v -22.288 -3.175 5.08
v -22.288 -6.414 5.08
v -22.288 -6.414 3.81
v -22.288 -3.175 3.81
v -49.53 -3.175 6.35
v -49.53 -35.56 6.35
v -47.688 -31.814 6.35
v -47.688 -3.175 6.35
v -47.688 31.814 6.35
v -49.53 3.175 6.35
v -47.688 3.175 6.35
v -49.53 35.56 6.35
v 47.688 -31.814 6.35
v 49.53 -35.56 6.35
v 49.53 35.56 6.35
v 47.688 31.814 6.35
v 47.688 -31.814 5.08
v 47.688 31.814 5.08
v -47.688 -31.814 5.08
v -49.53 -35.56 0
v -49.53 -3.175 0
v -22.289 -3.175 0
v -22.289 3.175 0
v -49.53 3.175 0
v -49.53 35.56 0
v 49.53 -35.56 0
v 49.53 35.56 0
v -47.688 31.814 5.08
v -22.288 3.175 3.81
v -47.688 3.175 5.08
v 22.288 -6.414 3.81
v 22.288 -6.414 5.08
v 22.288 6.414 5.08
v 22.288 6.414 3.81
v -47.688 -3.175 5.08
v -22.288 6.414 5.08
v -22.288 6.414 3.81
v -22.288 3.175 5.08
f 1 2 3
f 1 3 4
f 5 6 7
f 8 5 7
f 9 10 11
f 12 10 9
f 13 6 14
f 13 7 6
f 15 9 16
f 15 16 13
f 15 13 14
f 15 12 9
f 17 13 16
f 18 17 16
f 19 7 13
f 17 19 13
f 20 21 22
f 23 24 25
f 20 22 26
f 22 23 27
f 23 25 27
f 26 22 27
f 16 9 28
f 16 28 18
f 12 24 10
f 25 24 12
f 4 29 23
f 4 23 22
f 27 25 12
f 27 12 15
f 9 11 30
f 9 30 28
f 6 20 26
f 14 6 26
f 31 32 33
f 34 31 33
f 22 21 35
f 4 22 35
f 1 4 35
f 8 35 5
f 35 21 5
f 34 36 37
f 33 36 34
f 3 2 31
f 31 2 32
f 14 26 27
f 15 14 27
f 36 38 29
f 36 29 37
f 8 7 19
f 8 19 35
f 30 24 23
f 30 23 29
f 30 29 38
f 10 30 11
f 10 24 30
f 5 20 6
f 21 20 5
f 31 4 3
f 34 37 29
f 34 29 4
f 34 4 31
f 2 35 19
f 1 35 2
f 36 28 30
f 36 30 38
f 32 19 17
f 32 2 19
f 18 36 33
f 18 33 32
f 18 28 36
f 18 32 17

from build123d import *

# Parameters (mm, degrees)
F0_W     = 99.06
F0_H     = 71.12
F1_DEPTH = 6.35
F2_W     = 95.377
F2_H     = 63.627
F3_DEPTH = 1.27
F4_W     = 44.577
F4_H     = 12.827
F5_DEPTH = 1.27
F6_W     = 6.35
F6_H     = 6.35
F7_DEPTH = 27.2415


with BuildPart() as f1:
    # F0 (on Top) → F1 (new body)
    with BuildSketch(Plane.XY):
        Rectangle(F0_W, F0_H)
    extrude(amount=F1_DEPTH)

    # F2 (on face) → F3 (cut)
    with BuildSketch(Plane.XY.offset(6.35)):
        Rectangle(F2_W, F2_H)
    extrude(amount=-F3_DEPTH, mode=Mode.SUBTRACT)

    # F4 (on face) → F5 (cut)
    with BuildSketch(Plane.XY.offset(5.08)):
        Rectangle(F4_W, F4_H)
    extrude(amount=-F5_DEPTH, mode=Mode.SUBTRACT)

    # F6 (on face) → F7 (cut, through all)
    with BuildSketch(Plane(origin=(-49.53, 0, 0), x_dir=(0, -1, 0), z_dir=(-1, 0, 0))):
        with Locations((0, 3.175)):
            Rectangle(F6_W, F6_H)
    extrude(amount=-F7_DEPTH, mode=Mode.SUBTRACT)


solid = f1.part
